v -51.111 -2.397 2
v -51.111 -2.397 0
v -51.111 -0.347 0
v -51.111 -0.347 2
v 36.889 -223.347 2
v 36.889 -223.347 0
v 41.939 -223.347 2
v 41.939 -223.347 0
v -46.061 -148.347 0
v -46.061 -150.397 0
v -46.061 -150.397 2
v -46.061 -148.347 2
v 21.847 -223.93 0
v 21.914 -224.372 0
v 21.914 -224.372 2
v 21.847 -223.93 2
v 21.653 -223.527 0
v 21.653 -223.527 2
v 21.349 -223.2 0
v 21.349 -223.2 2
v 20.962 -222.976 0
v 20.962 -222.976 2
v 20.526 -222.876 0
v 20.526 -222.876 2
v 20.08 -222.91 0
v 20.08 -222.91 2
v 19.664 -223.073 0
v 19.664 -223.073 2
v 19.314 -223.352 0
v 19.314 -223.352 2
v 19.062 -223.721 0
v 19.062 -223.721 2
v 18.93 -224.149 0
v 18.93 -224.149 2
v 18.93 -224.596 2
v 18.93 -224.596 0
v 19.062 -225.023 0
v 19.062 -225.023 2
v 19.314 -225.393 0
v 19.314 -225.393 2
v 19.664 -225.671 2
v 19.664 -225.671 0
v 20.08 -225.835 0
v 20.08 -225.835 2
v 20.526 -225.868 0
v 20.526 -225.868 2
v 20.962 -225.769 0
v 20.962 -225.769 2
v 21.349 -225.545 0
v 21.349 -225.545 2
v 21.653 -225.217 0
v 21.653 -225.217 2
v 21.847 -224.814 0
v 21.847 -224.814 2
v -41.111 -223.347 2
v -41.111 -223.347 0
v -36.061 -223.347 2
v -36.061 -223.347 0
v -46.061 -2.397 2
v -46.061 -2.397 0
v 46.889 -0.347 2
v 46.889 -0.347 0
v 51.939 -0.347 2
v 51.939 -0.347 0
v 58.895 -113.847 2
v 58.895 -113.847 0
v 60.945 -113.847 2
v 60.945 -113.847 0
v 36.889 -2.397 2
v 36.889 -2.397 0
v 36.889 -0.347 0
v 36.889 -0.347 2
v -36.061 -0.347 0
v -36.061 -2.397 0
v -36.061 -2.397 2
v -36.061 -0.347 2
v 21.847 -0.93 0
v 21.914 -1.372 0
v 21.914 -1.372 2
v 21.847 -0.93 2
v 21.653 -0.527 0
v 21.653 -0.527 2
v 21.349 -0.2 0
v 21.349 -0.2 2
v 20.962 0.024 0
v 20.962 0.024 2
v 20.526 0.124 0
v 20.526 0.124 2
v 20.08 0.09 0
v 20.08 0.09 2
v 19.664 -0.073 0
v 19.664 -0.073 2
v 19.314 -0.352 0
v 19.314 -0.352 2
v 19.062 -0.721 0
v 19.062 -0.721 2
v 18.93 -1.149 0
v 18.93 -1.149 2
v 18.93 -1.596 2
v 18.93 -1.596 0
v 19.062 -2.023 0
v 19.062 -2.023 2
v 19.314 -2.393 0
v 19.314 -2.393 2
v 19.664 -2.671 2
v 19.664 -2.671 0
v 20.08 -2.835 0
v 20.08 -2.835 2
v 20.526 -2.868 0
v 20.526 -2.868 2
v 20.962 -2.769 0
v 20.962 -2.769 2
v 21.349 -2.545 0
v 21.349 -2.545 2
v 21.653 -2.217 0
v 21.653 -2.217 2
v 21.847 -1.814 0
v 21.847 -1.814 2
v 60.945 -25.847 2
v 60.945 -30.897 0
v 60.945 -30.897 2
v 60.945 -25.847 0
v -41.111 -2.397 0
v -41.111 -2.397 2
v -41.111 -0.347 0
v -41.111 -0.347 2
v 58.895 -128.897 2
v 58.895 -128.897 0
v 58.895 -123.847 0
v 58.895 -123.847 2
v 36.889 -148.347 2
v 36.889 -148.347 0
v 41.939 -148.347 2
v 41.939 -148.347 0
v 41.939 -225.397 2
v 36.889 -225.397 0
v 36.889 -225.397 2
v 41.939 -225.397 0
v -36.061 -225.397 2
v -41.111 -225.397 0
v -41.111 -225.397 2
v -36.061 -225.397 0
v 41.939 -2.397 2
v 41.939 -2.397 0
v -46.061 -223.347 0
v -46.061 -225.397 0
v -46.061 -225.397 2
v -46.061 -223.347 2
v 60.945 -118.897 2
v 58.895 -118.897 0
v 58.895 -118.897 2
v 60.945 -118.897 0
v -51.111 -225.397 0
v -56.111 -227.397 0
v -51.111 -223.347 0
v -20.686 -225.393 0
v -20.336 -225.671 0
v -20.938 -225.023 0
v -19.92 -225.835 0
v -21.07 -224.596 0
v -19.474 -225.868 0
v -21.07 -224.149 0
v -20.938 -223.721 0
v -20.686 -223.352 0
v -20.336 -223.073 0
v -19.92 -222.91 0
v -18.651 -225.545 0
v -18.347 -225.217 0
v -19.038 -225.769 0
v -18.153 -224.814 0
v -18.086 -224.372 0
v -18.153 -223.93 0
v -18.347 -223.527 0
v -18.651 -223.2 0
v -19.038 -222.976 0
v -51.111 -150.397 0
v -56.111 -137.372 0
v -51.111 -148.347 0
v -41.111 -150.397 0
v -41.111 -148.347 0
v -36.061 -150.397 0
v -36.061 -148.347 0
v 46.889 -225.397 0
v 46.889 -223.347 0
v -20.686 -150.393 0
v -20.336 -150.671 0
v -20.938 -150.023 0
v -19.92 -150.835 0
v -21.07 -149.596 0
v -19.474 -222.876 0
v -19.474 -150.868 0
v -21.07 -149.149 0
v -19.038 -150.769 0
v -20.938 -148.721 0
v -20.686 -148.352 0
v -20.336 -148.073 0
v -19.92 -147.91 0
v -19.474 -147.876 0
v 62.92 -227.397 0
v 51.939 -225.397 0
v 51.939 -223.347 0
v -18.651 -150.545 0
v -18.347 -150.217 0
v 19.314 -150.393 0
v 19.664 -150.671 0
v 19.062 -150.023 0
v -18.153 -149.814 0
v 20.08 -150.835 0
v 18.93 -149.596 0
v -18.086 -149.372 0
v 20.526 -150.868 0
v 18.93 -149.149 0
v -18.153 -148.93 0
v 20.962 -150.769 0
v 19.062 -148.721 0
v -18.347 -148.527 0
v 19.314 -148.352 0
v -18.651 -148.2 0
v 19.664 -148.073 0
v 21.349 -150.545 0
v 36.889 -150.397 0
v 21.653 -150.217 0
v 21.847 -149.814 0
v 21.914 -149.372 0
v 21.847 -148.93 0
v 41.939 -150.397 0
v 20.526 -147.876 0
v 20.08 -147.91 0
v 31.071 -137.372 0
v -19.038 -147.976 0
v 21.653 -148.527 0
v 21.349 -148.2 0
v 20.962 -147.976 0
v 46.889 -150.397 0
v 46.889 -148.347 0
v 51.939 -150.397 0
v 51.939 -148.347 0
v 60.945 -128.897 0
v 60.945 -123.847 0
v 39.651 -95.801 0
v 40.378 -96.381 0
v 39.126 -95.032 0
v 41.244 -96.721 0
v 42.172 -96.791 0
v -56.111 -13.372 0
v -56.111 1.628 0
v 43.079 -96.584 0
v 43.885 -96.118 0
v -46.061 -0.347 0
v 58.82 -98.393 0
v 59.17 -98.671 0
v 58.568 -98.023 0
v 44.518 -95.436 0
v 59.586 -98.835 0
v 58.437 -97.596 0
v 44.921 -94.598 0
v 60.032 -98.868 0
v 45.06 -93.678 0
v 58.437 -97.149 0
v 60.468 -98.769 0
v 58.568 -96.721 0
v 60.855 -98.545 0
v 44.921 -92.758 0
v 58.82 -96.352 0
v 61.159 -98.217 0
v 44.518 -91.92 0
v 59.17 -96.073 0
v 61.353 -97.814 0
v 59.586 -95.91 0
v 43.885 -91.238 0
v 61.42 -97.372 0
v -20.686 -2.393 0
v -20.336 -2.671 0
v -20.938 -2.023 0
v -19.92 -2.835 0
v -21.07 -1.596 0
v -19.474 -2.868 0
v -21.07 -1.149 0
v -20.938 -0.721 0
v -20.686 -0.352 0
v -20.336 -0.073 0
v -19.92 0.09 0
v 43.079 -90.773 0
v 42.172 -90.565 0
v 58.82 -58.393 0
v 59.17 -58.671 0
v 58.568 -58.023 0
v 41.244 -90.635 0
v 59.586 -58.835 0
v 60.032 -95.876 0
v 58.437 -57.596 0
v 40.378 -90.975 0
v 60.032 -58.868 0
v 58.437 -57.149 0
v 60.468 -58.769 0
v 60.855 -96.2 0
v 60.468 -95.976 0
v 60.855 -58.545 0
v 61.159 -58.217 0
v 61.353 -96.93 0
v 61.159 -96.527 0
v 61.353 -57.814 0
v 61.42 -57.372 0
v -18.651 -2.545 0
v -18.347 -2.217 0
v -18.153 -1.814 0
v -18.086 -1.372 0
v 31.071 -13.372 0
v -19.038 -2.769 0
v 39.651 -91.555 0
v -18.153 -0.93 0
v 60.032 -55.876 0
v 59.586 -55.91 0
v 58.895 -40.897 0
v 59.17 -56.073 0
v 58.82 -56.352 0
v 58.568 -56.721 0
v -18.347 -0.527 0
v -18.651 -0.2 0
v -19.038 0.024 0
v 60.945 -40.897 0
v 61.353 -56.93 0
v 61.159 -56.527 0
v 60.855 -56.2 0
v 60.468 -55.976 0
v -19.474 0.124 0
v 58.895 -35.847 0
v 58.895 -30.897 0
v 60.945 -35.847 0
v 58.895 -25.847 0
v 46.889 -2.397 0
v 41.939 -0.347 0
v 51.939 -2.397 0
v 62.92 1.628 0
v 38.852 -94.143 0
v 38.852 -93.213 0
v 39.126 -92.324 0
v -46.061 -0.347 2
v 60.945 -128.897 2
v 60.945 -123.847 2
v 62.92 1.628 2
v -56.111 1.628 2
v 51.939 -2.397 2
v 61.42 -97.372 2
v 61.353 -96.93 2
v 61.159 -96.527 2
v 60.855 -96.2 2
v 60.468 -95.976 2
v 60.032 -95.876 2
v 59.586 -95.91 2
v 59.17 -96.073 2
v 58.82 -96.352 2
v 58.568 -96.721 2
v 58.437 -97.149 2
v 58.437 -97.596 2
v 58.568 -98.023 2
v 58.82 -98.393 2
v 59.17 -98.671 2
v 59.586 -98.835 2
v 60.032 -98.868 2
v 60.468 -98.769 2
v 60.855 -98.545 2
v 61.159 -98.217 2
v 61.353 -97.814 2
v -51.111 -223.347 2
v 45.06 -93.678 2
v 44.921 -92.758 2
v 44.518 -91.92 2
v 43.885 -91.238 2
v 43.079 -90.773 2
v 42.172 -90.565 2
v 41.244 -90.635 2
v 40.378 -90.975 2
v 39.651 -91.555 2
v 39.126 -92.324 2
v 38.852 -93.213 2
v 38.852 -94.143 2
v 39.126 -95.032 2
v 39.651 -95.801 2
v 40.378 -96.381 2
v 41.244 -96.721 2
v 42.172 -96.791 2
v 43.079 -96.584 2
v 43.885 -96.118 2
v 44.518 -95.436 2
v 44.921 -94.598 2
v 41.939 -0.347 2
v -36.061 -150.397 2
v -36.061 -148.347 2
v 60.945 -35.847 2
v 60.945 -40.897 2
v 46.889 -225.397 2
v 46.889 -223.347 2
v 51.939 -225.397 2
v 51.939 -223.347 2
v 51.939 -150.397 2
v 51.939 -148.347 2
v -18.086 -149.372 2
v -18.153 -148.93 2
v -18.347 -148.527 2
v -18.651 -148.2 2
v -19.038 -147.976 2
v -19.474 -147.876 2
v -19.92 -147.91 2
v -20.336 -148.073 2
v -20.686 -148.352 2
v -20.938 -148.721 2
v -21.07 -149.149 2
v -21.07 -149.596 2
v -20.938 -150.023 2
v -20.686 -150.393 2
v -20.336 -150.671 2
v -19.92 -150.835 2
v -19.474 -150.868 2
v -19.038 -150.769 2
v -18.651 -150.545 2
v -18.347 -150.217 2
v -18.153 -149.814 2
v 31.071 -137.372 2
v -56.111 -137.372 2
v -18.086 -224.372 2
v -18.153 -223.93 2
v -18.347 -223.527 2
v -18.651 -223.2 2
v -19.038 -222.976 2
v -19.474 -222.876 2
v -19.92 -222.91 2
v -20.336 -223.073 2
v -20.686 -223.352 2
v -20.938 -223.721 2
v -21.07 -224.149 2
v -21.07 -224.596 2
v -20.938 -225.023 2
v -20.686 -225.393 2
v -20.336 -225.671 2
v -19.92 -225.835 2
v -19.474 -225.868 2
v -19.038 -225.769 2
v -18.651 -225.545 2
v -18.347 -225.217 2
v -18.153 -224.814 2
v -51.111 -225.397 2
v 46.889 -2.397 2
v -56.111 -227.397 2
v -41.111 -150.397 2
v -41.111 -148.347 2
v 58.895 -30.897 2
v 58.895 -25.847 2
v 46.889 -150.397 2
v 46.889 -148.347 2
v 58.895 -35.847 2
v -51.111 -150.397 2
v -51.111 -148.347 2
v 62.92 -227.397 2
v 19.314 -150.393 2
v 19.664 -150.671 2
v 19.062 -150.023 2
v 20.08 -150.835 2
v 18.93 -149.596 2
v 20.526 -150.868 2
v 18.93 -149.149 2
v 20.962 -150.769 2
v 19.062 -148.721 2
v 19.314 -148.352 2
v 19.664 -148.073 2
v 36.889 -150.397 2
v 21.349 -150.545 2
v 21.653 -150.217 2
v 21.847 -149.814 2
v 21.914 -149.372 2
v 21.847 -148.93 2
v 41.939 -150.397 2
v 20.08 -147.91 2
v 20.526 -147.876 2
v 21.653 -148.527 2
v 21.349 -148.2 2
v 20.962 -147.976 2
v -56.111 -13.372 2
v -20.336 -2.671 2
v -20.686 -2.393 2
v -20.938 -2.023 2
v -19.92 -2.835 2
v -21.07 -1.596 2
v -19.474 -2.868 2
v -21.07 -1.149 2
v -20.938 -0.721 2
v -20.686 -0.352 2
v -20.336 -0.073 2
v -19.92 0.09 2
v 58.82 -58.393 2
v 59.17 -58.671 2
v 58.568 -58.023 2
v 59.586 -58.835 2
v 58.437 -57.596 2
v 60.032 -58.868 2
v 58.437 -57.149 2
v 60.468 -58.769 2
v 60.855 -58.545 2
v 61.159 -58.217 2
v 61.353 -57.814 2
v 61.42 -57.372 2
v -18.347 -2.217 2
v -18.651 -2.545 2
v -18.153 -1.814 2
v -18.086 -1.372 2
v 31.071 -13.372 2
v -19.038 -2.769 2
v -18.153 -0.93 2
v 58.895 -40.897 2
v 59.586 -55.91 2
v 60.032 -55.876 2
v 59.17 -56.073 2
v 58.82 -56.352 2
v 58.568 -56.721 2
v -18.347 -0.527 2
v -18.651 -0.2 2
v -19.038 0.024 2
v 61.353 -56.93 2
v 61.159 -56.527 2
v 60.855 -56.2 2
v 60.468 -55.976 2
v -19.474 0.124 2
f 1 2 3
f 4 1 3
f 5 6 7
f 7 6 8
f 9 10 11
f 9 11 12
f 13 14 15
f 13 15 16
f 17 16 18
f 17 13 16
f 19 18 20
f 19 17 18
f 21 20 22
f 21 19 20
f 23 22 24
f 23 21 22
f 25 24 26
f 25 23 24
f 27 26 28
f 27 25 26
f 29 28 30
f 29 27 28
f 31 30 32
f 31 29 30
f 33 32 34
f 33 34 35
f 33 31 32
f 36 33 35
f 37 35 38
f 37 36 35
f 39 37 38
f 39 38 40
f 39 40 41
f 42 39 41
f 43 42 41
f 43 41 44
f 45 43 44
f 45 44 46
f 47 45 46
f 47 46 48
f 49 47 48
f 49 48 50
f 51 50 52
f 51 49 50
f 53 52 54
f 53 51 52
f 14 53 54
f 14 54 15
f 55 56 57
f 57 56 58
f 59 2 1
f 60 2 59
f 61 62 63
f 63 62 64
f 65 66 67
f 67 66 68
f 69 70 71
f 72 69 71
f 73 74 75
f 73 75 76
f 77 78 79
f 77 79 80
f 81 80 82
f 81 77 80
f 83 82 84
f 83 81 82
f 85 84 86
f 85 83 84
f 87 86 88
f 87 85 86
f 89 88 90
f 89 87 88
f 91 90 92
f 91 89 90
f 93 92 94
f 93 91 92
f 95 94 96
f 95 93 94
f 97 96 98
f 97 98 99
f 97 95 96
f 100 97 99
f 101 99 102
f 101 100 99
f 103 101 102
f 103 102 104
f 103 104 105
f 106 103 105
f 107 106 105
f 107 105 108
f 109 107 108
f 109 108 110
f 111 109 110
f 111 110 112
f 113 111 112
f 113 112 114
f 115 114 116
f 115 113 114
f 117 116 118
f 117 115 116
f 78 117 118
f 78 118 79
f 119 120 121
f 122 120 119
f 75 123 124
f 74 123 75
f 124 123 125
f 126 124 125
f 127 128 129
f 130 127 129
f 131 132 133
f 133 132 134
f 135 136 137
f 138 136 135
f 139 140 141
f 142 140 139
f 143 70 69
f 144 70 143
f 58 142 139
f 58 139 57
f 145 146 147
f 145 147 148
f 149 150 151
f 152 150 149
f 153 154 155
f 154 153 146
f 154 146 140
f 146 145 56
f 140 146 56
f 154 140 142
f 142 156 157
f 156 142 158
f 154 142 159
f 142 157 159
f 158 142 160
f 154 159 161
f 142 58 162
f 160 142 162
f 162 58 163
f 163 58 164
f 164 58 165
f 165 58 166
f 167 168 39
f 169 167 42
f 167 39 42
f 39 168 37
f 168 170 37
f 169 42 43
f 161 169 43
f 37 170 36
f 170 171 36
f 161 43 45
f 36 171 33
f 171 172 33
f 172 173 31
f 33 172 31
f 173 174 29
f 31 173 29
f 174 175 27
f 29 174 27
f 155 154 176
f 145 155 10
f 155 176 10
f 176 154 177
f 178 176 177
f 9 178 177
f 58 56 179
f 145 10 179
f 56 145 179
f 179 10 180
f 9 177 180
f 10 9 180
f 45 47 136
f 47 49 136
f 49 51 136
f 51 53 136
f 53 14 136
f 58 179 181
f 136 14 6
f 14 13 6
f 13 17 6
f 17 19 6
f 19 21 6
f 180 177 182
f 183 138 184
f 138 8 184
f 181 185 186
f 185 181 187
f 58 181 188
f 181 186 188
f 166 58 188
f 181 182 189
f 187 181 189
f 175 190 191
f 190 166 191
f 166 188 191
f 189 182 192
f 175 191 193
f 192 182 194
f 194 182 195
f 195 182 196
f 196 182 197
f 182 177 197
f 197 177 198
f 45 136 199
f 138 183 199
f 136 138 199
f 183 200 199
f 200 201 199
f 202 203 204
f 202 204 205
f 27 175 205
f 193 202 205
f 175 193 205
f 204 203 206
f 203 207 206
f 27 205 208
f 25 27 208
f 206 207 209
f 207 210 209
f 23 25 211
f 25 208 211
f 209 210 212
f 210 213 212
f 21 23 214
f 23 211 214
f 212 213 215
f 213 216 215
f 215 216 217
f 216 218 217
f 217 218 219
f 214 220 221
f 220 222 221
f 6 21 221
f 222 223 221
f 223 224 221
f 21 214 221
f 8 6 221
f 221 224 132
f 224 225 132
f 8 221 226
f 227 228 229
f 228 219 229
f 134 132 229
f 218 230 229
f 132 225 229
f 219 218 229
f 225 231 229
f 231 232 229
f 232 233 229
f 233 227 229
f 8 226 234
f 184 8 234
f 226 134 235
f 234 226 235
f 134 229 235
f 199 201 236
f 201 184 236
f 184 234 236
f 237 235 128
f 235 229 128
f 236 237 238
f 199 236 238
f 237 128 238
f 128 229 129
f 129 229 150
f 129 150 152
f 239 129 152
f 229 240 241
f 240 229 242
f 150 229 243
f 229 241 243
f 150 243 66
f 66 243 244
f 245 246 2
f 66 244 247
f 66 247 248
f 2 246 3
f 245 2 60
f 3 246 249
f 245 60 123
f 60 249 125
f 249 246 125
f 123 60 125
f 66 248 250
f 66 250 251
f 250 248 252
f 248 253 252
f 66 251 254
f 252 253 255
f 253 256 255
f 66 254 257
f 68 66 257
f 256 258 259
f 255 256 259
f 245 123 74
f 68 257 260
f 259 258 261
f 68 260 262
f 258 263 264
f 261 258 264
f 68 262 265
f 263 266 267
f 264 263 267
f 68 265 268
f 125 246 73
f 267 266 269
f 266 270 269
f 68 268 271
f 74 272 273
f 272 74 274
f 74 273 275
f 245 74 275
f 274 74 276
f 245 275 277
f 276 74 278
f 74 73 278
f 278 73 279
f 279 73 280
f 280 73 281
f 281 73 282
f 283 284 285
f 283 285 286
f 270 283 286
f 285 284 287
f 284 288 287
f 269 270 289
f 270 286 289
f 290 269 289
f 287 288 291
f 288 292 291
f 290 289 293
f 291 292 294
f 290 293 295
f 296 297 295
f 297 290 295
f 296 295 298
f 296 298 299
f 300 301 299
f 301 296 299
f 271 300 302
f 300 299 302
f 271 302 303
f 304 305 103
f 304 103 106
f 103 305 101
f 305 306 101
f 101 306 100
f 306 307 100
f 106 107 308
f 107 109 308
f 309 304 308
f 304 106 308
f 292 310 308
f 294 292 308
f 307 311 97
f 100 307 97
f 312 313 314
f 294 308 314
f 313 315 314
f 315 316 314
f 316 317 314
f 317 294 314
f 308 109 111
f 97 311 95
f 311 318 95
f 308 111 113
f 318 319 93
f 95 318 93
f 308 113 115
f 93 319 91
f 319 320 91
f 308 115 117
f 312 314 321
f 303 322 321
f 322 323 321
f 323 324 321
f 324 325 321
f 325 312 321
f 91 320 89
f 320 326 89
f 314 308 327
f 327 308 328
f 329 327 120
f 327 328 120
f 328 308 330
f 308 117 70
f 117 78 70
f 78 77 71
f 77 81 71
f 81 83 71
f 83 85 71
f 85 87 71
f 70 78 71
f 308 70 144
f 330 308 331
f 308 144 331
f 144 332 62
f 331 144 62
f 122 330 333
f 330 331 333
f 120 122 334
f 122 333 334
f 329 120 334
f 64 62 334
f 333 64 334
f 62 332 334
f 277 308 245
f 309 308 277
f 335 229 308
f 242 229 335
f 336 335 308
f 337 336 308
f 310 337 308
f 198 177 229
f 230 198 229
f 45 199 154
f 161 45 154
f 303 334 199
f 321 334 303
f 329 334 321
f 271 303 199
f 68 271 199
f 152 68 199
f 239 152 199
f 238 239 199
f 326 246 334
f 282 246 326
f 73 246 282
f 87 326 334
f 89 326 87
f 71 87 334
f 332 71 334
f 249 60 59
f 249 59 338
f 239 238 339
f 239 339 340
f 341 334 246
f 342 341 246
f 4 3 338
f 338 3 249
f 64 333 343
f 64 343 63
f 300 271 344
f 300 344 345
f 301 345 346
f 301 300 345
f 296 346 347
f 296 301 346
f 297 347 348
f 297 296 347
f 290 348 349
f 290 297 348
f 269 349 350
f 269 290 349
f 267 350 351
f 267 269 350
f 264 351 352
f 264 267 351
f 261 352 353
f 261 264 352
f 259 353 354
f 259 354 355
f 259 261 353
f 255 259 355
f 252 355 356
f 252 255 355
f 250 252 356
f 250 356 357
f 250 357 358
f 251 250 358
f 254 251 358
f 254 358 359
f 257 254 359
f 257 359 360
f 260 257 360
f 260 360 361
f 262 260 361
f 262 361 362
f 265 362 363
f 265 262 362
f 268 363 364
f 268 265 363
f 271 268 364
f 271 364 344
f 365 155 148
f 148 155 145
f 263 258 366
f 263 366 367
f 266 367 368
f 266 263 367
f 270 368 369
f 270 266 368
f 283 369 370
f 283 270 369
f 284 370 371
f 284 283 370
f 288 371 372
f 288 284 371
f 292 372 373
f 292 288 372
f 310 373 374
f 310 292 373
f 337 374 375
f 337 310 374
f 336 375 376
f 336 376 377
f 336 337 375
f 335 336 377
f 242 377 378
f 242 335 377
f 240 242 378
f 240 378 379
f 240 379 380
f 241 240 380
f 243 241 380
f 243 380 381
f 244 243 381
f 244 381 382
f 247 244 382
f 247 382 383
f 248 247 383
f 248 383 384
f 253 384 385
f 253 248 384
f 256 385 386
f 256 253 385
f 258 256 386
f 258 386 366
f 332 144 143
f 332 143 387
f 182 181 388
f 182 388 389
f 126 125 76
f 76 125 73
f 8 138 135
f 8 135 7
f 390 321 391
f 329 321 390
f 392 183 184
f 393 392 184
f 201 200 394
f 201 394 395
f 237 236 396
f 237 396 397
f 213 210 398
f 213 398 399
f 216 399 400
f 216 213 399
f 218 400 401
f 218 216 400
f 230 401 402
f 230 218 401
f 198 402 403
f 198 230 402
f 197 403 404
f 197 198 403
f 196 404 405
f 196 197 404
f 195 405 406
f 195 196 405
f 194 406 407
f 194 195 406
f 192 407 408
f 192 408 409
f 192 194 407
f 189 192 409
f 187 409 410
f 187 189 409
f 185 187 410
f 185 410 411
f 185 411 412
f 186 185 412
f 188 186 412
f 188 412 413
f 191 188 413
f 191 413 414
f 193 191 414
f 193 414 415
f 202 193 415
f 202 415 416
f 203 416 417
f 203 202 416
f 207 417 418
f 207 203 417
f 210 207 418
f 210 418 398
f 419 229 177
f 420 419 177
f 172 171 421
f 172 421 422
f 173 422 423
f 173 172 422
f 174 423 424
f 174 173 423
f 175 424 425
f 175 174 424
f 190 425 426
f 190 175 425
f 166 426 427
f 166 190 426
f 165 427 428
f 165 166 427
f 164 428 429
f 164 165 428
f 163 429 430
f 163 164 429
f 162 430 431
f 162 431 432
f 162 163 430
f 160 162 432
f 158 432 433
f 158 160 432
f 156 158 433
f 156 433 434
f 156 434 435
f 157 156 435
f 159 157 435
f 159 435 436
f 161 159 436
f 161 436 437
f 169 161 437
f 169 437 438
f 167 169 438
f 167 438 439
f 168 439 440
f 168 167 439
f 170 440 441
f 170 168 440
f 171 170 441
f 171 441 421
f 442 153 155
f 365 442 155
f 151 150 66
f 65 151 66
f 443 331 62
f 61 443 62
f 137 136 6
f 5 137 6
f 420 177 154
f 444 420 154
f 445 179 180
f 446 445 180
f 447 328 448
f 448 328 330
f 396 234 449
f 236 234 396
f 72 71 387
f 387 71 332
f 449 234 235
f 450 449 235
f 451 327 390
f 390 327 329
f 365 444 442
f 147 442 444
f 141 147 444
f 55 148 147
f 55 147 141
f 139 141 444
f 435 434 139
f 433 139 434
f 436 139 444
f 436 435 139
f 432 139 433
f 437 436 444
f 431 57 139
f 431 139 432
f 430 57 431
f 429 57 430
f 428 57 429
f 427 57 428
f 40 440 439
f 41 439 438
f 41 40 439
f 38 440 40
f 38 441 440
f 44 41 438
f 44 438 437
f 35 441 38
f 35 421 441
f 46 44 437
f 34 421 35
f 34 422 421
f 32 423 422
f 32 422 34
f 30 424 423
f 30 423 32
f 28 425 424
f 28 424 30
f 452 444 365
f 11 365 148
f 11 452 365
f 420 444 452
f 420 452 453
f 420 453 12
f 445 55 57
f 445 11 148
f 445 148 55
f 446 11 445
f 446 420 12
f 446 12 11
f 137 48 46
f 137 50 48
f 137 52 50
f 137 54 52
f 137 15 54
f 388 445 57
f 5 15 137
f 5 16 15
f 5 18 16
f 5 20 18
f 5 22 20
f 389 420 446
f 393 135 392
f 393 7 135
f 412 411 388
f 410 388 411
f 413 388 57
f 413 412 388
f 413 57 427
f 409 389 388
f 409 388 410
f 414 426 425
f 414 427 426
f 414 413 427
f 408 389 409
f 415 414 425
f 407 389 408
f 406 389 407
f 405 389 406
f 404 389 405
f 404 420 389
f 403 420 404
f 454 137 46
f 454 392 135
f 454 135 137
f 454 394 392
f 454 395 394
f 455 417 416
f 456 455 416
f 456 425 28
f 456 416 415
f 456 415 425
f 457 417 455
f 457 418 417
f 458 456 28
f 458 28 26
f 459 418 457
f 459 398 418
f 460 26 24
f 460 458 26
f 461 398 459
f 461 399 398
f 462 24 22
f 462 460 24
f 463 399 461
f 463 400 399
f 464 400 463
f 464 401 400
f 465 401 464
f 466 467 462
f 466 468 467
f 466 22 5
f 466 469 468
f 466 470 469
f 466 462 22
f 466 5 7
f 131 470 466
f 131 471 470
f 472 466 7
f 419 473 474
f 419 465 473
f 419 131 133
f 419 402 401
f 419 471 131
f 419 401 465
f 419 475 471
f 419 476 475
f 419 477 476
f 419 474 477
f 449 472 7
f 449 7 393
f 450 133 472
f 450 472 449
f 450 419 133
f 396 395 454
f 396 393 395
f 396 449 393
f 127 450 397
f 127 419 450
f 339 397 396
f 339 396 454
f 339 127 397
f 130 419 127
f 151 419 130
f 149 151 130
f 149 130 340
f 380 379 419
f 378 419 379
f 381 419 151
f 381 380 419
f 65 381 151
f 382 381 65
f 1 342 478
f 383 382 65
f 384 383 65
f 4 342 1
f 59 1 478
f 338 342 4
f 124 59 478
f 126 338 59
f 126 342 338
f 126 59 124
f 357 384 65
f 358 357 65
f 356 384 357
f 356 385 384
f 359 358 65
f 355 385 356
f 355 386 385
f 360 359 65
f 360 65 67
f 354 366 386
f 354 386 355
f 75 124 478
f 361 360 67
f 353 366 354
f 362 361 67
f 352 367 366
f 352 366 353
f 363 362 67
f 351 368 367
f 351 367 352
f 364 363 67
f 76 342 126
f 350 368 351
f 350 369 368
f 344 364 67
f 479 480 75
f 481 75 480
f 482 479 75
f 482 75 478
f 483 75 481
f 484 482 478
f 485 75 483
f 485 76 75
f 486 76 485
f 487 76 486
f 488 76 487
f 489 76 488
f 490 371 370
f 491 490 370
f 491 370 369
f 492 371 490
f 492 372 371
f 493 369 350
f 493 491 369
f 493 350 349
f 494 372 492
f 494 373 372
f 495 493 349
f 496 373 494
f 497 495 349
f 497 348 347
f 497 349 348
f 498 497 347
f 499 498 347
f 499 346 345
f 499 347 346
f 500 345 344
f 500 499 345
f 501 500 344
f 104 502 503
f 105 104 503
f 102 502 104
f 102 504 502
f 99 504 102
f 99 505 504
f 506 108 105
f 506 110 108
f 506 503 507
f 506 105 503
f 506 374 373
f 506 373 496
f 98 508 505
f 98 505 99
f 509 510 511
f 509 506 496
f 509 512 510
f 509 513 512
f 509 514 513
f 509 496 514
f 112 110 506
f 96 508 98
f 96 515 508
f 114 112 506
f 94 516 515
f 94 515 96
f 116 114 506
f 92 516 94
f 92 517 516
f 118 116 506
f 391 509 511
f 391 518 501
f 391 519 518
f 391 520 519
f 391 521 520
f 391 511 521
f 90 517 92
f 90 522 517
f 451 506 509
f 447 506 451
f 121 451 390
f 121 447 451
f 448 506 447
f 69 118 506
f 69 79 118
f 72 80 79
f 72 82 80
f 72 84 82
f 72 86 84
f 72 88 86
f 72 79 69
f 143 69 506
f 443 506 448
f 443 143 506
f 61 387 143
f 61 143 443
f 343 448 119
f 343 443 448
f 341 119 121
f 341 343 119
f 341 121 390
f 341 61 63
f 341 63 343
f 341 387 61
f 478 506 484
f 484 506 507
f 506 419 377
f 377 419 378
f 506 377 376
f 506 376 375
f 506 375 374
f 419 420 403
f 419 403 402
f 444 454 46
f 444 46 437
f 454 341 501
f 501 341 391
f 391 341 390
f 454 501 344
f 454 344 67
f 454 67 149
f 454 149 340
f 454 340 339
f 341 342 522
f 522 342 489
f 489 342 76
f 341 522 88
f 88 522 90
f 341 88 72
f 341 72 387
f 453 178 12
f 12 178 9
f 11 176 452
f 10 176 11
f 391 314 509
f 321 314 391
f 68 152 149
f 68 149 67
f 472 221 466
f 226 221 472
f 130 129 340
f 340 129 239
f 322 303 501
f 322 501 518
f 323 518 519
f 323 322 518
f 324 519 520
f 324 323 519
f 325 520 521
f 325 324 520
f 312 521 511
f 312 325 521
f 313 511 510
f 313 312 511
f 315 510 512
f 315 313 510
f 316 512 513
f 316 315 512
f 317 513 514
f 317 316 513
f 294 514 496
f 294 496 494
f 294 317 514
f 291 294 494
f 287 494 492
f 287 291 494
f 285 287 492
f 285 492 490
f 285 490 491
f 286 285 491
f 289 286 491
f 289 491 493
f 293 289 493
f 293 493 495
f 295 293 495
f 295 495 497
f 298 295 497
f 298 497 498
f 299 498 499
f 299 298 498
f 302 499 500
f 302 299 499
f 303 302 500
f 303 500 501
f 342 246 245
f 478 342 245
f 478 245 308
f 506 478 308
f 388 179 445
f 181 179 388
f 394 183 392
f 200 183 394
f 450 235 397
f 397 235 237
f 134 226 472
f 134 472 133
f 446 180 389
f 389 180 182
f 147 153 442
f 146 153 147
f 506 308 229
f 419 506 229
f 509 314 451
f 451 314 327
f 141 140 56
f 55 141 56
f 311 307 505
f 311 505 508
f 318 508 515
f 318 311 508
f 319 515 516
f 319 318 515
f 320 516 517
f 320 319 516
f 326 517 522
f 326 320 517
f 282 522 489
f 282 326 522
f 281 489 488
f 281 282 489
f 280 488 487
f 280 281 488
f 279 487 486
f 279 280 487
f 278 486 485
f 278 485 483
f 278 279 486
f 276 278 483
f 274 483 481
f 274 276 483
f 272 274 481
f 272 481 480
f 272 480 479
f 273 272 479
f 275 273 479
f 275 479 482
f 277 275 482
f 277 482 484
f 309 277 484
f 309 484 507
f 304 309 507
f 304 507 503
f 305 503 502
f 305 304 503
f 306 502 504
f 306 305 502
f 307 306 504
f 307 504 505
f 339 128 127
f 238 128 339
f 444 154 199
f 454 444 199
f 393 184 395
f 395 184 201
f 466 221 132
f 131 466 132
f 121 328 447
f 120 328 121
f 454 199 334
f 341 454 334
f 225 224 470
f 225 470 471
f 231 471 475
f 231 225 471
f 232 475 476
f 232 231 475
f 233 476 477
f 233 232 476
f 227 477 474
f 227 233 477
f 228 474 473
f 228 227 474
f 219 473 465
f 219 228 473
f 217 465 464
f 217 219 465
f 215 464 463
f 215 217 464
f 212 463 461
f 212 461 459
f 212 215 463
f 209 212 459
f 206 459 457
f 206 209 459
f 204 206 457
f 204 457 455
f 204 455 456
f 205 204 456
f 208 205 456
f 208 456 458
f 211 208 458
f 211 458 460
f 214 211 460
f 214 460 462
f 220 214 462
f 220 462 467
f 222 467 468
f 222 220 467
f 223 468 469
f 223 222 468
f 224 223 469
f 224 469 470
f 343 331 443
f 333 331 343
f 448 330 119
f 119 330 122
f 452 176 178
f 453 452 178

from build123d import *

# Parameters (mm, degrees)
SKETCH_1_R      = 1.5
SKETCH_1_R_2    = 3.121318996
SKETCH_1_W      = 5.05
SKETCH_1_H      = 2.05
SKETCH_1_W_2    = 2.05
SKETCH_1_H_2    = 5.05
EXTRUDE_1_DEPTH = 2


with BuildPart() as part:
    # 草图1 → 凸台-拉伸1 (new body)
    with BuildSketch(Plane.XY):
        Polygon((-56.111334712, -13.372248853), (31.071025228, -13.372248853), (31.071025228, -137.372248853), (-56.111334712, -137.372248853), (-56.111334712, -152.372248853), (-56.111334712, -227.397248853), (62.919821756, -227.397248853), (62.919821756, -152.372248853), (62.919821756, 1.627751147), (-56.111334712, 1.627751147), align=None)
        with Locations((-19.586334712, -1.372248853)):
            Circle(SKETCH_1_R, mode=Mode.SUBTRACT)
        with Locations((20.413665288, -1.372248853)):
            Circle(SKETCH_1_R, mode=Mode.SUBTRACT)
        with Locations((-19.586334712, -149.372248853)):
            Circle(SKETCH_1_R, mode=Mode.SUBTRACT)
        with Locations((20.413665288, -149.372248853)):
            Circle(SKETCH_1_R, mode=Mode.SUBTRACT)
        with Locations((59.919821756, -97.372248853)):
            Circle(SKETCH_1_R, mode=Mode.SUBTRACT)
        with Locations((59.919821756, -57.372248853)):
            Circle(SKETCH_1_R, mode=Mode.SUBTRACT)
        with Locations((41.938665288, -93.678088908)):
            Circle(SKETCH_1_R_2, mode=Mode.SUBTRACT)
        with Locations((-19.586334712, -224.372248853)):
            Circle(SKETCH_1_R, mode=Mode.SUBTRACT)
        with Locations((20.413665288, -224.372248853)):
            Circle(SKETCH_1_R, mode=Mode.SUBTRACT)
        with Locations((39.413665288, -1.372248853)):
            Rectangle(SKETCH_1_W, SKETCH_1_H, mode=Mode.SUBTRACT)
        with Locations((49.413665288, -1.372248853)):
            Rectangle(SKETCH_1_W, SKETCH_1_H, mode=Mode.SUBTRACT)
        with Locations((-48.586334712, -1.372248853)):
            Rectangle(SKETCH_1_W, SKETCH_1_H, mode=Mode.SUBTRACT)
        with Locations((-38.586334712, -1.372248853)):
            Rectangle(SKETCH_1_W, SKETCH_1_H, mode=Mode.SUBTRACT)
        with Locations((39.413665288, -149.372248853)):
            Rectangle(SKETCH_1_W, SKETCH_1_H, mode=Mode.SUBTRACT)
        with Locations((49.413665288, -149.372248853)):
            Rectangle(SKETCH_1_W, SKETCH_1_H, mode=Mode.SUBTRACT)
        with Locations((-48.586334712, -149.372248853)):
            Rectangle(SKETCH_1_W, SKETCH_1_H, mode=Mode.SUBTRACT)
        with Locations((-38.586334712, -149.372248853)):
            Rectangle(SKETCH_1_W, SKETCH_1_H, mode=Mode.SUBTRACT)
        with Locations((59.919821756, -38.372248853)):
            Rectangle(SKETCH_1_W_2, SKETCH_1_H_2, mode=Mode.SUBTRACT)
        with Locations((59.919821756, -28.372248853)):
            Rectangle(SKETCH_1_W_2, SKETCH_1_H_2, mode=Mode.SUBTRACT)
        with Locations((59.919821756, -126.372248853)):
            Rectangle(SKETCH_1_W_2, SKETCH_1_H_2, mode=Mode.SUBTRACT)
        with Locations((59.919821756, -116.372248853)):
            Rectangle(SKETCH_1_W_2, SKETCH_1_H_2, mode=Mode.SUBTRACT)
        with Locations((39.413665288, -224.372248853)):
            Rectangle(SKETCH_1_W, SKETCH_1_H, mode=Mode.SUBTRACT)
        with Locations((49.413665288, -224.372248853)):
            Rectangle(SKETCH_1_W, SKETCH_1_H, mode=Mode.SUBTRACT)
        with Locations((-48.586334712, -224.372248853)):
            Rectangle(SKETCH_1_W, SKETCH_1_H, mode=Mode.SUBTRACT)
        with Locations((-38.586334712, -224.372248853)):
            Rectangle(SKETCH_1_W, SKETCH_1_H, mode=Mode.SUBTRACT)
    extrude(amount=EXTRUDE_1_DEPTH)


solid = part.part
